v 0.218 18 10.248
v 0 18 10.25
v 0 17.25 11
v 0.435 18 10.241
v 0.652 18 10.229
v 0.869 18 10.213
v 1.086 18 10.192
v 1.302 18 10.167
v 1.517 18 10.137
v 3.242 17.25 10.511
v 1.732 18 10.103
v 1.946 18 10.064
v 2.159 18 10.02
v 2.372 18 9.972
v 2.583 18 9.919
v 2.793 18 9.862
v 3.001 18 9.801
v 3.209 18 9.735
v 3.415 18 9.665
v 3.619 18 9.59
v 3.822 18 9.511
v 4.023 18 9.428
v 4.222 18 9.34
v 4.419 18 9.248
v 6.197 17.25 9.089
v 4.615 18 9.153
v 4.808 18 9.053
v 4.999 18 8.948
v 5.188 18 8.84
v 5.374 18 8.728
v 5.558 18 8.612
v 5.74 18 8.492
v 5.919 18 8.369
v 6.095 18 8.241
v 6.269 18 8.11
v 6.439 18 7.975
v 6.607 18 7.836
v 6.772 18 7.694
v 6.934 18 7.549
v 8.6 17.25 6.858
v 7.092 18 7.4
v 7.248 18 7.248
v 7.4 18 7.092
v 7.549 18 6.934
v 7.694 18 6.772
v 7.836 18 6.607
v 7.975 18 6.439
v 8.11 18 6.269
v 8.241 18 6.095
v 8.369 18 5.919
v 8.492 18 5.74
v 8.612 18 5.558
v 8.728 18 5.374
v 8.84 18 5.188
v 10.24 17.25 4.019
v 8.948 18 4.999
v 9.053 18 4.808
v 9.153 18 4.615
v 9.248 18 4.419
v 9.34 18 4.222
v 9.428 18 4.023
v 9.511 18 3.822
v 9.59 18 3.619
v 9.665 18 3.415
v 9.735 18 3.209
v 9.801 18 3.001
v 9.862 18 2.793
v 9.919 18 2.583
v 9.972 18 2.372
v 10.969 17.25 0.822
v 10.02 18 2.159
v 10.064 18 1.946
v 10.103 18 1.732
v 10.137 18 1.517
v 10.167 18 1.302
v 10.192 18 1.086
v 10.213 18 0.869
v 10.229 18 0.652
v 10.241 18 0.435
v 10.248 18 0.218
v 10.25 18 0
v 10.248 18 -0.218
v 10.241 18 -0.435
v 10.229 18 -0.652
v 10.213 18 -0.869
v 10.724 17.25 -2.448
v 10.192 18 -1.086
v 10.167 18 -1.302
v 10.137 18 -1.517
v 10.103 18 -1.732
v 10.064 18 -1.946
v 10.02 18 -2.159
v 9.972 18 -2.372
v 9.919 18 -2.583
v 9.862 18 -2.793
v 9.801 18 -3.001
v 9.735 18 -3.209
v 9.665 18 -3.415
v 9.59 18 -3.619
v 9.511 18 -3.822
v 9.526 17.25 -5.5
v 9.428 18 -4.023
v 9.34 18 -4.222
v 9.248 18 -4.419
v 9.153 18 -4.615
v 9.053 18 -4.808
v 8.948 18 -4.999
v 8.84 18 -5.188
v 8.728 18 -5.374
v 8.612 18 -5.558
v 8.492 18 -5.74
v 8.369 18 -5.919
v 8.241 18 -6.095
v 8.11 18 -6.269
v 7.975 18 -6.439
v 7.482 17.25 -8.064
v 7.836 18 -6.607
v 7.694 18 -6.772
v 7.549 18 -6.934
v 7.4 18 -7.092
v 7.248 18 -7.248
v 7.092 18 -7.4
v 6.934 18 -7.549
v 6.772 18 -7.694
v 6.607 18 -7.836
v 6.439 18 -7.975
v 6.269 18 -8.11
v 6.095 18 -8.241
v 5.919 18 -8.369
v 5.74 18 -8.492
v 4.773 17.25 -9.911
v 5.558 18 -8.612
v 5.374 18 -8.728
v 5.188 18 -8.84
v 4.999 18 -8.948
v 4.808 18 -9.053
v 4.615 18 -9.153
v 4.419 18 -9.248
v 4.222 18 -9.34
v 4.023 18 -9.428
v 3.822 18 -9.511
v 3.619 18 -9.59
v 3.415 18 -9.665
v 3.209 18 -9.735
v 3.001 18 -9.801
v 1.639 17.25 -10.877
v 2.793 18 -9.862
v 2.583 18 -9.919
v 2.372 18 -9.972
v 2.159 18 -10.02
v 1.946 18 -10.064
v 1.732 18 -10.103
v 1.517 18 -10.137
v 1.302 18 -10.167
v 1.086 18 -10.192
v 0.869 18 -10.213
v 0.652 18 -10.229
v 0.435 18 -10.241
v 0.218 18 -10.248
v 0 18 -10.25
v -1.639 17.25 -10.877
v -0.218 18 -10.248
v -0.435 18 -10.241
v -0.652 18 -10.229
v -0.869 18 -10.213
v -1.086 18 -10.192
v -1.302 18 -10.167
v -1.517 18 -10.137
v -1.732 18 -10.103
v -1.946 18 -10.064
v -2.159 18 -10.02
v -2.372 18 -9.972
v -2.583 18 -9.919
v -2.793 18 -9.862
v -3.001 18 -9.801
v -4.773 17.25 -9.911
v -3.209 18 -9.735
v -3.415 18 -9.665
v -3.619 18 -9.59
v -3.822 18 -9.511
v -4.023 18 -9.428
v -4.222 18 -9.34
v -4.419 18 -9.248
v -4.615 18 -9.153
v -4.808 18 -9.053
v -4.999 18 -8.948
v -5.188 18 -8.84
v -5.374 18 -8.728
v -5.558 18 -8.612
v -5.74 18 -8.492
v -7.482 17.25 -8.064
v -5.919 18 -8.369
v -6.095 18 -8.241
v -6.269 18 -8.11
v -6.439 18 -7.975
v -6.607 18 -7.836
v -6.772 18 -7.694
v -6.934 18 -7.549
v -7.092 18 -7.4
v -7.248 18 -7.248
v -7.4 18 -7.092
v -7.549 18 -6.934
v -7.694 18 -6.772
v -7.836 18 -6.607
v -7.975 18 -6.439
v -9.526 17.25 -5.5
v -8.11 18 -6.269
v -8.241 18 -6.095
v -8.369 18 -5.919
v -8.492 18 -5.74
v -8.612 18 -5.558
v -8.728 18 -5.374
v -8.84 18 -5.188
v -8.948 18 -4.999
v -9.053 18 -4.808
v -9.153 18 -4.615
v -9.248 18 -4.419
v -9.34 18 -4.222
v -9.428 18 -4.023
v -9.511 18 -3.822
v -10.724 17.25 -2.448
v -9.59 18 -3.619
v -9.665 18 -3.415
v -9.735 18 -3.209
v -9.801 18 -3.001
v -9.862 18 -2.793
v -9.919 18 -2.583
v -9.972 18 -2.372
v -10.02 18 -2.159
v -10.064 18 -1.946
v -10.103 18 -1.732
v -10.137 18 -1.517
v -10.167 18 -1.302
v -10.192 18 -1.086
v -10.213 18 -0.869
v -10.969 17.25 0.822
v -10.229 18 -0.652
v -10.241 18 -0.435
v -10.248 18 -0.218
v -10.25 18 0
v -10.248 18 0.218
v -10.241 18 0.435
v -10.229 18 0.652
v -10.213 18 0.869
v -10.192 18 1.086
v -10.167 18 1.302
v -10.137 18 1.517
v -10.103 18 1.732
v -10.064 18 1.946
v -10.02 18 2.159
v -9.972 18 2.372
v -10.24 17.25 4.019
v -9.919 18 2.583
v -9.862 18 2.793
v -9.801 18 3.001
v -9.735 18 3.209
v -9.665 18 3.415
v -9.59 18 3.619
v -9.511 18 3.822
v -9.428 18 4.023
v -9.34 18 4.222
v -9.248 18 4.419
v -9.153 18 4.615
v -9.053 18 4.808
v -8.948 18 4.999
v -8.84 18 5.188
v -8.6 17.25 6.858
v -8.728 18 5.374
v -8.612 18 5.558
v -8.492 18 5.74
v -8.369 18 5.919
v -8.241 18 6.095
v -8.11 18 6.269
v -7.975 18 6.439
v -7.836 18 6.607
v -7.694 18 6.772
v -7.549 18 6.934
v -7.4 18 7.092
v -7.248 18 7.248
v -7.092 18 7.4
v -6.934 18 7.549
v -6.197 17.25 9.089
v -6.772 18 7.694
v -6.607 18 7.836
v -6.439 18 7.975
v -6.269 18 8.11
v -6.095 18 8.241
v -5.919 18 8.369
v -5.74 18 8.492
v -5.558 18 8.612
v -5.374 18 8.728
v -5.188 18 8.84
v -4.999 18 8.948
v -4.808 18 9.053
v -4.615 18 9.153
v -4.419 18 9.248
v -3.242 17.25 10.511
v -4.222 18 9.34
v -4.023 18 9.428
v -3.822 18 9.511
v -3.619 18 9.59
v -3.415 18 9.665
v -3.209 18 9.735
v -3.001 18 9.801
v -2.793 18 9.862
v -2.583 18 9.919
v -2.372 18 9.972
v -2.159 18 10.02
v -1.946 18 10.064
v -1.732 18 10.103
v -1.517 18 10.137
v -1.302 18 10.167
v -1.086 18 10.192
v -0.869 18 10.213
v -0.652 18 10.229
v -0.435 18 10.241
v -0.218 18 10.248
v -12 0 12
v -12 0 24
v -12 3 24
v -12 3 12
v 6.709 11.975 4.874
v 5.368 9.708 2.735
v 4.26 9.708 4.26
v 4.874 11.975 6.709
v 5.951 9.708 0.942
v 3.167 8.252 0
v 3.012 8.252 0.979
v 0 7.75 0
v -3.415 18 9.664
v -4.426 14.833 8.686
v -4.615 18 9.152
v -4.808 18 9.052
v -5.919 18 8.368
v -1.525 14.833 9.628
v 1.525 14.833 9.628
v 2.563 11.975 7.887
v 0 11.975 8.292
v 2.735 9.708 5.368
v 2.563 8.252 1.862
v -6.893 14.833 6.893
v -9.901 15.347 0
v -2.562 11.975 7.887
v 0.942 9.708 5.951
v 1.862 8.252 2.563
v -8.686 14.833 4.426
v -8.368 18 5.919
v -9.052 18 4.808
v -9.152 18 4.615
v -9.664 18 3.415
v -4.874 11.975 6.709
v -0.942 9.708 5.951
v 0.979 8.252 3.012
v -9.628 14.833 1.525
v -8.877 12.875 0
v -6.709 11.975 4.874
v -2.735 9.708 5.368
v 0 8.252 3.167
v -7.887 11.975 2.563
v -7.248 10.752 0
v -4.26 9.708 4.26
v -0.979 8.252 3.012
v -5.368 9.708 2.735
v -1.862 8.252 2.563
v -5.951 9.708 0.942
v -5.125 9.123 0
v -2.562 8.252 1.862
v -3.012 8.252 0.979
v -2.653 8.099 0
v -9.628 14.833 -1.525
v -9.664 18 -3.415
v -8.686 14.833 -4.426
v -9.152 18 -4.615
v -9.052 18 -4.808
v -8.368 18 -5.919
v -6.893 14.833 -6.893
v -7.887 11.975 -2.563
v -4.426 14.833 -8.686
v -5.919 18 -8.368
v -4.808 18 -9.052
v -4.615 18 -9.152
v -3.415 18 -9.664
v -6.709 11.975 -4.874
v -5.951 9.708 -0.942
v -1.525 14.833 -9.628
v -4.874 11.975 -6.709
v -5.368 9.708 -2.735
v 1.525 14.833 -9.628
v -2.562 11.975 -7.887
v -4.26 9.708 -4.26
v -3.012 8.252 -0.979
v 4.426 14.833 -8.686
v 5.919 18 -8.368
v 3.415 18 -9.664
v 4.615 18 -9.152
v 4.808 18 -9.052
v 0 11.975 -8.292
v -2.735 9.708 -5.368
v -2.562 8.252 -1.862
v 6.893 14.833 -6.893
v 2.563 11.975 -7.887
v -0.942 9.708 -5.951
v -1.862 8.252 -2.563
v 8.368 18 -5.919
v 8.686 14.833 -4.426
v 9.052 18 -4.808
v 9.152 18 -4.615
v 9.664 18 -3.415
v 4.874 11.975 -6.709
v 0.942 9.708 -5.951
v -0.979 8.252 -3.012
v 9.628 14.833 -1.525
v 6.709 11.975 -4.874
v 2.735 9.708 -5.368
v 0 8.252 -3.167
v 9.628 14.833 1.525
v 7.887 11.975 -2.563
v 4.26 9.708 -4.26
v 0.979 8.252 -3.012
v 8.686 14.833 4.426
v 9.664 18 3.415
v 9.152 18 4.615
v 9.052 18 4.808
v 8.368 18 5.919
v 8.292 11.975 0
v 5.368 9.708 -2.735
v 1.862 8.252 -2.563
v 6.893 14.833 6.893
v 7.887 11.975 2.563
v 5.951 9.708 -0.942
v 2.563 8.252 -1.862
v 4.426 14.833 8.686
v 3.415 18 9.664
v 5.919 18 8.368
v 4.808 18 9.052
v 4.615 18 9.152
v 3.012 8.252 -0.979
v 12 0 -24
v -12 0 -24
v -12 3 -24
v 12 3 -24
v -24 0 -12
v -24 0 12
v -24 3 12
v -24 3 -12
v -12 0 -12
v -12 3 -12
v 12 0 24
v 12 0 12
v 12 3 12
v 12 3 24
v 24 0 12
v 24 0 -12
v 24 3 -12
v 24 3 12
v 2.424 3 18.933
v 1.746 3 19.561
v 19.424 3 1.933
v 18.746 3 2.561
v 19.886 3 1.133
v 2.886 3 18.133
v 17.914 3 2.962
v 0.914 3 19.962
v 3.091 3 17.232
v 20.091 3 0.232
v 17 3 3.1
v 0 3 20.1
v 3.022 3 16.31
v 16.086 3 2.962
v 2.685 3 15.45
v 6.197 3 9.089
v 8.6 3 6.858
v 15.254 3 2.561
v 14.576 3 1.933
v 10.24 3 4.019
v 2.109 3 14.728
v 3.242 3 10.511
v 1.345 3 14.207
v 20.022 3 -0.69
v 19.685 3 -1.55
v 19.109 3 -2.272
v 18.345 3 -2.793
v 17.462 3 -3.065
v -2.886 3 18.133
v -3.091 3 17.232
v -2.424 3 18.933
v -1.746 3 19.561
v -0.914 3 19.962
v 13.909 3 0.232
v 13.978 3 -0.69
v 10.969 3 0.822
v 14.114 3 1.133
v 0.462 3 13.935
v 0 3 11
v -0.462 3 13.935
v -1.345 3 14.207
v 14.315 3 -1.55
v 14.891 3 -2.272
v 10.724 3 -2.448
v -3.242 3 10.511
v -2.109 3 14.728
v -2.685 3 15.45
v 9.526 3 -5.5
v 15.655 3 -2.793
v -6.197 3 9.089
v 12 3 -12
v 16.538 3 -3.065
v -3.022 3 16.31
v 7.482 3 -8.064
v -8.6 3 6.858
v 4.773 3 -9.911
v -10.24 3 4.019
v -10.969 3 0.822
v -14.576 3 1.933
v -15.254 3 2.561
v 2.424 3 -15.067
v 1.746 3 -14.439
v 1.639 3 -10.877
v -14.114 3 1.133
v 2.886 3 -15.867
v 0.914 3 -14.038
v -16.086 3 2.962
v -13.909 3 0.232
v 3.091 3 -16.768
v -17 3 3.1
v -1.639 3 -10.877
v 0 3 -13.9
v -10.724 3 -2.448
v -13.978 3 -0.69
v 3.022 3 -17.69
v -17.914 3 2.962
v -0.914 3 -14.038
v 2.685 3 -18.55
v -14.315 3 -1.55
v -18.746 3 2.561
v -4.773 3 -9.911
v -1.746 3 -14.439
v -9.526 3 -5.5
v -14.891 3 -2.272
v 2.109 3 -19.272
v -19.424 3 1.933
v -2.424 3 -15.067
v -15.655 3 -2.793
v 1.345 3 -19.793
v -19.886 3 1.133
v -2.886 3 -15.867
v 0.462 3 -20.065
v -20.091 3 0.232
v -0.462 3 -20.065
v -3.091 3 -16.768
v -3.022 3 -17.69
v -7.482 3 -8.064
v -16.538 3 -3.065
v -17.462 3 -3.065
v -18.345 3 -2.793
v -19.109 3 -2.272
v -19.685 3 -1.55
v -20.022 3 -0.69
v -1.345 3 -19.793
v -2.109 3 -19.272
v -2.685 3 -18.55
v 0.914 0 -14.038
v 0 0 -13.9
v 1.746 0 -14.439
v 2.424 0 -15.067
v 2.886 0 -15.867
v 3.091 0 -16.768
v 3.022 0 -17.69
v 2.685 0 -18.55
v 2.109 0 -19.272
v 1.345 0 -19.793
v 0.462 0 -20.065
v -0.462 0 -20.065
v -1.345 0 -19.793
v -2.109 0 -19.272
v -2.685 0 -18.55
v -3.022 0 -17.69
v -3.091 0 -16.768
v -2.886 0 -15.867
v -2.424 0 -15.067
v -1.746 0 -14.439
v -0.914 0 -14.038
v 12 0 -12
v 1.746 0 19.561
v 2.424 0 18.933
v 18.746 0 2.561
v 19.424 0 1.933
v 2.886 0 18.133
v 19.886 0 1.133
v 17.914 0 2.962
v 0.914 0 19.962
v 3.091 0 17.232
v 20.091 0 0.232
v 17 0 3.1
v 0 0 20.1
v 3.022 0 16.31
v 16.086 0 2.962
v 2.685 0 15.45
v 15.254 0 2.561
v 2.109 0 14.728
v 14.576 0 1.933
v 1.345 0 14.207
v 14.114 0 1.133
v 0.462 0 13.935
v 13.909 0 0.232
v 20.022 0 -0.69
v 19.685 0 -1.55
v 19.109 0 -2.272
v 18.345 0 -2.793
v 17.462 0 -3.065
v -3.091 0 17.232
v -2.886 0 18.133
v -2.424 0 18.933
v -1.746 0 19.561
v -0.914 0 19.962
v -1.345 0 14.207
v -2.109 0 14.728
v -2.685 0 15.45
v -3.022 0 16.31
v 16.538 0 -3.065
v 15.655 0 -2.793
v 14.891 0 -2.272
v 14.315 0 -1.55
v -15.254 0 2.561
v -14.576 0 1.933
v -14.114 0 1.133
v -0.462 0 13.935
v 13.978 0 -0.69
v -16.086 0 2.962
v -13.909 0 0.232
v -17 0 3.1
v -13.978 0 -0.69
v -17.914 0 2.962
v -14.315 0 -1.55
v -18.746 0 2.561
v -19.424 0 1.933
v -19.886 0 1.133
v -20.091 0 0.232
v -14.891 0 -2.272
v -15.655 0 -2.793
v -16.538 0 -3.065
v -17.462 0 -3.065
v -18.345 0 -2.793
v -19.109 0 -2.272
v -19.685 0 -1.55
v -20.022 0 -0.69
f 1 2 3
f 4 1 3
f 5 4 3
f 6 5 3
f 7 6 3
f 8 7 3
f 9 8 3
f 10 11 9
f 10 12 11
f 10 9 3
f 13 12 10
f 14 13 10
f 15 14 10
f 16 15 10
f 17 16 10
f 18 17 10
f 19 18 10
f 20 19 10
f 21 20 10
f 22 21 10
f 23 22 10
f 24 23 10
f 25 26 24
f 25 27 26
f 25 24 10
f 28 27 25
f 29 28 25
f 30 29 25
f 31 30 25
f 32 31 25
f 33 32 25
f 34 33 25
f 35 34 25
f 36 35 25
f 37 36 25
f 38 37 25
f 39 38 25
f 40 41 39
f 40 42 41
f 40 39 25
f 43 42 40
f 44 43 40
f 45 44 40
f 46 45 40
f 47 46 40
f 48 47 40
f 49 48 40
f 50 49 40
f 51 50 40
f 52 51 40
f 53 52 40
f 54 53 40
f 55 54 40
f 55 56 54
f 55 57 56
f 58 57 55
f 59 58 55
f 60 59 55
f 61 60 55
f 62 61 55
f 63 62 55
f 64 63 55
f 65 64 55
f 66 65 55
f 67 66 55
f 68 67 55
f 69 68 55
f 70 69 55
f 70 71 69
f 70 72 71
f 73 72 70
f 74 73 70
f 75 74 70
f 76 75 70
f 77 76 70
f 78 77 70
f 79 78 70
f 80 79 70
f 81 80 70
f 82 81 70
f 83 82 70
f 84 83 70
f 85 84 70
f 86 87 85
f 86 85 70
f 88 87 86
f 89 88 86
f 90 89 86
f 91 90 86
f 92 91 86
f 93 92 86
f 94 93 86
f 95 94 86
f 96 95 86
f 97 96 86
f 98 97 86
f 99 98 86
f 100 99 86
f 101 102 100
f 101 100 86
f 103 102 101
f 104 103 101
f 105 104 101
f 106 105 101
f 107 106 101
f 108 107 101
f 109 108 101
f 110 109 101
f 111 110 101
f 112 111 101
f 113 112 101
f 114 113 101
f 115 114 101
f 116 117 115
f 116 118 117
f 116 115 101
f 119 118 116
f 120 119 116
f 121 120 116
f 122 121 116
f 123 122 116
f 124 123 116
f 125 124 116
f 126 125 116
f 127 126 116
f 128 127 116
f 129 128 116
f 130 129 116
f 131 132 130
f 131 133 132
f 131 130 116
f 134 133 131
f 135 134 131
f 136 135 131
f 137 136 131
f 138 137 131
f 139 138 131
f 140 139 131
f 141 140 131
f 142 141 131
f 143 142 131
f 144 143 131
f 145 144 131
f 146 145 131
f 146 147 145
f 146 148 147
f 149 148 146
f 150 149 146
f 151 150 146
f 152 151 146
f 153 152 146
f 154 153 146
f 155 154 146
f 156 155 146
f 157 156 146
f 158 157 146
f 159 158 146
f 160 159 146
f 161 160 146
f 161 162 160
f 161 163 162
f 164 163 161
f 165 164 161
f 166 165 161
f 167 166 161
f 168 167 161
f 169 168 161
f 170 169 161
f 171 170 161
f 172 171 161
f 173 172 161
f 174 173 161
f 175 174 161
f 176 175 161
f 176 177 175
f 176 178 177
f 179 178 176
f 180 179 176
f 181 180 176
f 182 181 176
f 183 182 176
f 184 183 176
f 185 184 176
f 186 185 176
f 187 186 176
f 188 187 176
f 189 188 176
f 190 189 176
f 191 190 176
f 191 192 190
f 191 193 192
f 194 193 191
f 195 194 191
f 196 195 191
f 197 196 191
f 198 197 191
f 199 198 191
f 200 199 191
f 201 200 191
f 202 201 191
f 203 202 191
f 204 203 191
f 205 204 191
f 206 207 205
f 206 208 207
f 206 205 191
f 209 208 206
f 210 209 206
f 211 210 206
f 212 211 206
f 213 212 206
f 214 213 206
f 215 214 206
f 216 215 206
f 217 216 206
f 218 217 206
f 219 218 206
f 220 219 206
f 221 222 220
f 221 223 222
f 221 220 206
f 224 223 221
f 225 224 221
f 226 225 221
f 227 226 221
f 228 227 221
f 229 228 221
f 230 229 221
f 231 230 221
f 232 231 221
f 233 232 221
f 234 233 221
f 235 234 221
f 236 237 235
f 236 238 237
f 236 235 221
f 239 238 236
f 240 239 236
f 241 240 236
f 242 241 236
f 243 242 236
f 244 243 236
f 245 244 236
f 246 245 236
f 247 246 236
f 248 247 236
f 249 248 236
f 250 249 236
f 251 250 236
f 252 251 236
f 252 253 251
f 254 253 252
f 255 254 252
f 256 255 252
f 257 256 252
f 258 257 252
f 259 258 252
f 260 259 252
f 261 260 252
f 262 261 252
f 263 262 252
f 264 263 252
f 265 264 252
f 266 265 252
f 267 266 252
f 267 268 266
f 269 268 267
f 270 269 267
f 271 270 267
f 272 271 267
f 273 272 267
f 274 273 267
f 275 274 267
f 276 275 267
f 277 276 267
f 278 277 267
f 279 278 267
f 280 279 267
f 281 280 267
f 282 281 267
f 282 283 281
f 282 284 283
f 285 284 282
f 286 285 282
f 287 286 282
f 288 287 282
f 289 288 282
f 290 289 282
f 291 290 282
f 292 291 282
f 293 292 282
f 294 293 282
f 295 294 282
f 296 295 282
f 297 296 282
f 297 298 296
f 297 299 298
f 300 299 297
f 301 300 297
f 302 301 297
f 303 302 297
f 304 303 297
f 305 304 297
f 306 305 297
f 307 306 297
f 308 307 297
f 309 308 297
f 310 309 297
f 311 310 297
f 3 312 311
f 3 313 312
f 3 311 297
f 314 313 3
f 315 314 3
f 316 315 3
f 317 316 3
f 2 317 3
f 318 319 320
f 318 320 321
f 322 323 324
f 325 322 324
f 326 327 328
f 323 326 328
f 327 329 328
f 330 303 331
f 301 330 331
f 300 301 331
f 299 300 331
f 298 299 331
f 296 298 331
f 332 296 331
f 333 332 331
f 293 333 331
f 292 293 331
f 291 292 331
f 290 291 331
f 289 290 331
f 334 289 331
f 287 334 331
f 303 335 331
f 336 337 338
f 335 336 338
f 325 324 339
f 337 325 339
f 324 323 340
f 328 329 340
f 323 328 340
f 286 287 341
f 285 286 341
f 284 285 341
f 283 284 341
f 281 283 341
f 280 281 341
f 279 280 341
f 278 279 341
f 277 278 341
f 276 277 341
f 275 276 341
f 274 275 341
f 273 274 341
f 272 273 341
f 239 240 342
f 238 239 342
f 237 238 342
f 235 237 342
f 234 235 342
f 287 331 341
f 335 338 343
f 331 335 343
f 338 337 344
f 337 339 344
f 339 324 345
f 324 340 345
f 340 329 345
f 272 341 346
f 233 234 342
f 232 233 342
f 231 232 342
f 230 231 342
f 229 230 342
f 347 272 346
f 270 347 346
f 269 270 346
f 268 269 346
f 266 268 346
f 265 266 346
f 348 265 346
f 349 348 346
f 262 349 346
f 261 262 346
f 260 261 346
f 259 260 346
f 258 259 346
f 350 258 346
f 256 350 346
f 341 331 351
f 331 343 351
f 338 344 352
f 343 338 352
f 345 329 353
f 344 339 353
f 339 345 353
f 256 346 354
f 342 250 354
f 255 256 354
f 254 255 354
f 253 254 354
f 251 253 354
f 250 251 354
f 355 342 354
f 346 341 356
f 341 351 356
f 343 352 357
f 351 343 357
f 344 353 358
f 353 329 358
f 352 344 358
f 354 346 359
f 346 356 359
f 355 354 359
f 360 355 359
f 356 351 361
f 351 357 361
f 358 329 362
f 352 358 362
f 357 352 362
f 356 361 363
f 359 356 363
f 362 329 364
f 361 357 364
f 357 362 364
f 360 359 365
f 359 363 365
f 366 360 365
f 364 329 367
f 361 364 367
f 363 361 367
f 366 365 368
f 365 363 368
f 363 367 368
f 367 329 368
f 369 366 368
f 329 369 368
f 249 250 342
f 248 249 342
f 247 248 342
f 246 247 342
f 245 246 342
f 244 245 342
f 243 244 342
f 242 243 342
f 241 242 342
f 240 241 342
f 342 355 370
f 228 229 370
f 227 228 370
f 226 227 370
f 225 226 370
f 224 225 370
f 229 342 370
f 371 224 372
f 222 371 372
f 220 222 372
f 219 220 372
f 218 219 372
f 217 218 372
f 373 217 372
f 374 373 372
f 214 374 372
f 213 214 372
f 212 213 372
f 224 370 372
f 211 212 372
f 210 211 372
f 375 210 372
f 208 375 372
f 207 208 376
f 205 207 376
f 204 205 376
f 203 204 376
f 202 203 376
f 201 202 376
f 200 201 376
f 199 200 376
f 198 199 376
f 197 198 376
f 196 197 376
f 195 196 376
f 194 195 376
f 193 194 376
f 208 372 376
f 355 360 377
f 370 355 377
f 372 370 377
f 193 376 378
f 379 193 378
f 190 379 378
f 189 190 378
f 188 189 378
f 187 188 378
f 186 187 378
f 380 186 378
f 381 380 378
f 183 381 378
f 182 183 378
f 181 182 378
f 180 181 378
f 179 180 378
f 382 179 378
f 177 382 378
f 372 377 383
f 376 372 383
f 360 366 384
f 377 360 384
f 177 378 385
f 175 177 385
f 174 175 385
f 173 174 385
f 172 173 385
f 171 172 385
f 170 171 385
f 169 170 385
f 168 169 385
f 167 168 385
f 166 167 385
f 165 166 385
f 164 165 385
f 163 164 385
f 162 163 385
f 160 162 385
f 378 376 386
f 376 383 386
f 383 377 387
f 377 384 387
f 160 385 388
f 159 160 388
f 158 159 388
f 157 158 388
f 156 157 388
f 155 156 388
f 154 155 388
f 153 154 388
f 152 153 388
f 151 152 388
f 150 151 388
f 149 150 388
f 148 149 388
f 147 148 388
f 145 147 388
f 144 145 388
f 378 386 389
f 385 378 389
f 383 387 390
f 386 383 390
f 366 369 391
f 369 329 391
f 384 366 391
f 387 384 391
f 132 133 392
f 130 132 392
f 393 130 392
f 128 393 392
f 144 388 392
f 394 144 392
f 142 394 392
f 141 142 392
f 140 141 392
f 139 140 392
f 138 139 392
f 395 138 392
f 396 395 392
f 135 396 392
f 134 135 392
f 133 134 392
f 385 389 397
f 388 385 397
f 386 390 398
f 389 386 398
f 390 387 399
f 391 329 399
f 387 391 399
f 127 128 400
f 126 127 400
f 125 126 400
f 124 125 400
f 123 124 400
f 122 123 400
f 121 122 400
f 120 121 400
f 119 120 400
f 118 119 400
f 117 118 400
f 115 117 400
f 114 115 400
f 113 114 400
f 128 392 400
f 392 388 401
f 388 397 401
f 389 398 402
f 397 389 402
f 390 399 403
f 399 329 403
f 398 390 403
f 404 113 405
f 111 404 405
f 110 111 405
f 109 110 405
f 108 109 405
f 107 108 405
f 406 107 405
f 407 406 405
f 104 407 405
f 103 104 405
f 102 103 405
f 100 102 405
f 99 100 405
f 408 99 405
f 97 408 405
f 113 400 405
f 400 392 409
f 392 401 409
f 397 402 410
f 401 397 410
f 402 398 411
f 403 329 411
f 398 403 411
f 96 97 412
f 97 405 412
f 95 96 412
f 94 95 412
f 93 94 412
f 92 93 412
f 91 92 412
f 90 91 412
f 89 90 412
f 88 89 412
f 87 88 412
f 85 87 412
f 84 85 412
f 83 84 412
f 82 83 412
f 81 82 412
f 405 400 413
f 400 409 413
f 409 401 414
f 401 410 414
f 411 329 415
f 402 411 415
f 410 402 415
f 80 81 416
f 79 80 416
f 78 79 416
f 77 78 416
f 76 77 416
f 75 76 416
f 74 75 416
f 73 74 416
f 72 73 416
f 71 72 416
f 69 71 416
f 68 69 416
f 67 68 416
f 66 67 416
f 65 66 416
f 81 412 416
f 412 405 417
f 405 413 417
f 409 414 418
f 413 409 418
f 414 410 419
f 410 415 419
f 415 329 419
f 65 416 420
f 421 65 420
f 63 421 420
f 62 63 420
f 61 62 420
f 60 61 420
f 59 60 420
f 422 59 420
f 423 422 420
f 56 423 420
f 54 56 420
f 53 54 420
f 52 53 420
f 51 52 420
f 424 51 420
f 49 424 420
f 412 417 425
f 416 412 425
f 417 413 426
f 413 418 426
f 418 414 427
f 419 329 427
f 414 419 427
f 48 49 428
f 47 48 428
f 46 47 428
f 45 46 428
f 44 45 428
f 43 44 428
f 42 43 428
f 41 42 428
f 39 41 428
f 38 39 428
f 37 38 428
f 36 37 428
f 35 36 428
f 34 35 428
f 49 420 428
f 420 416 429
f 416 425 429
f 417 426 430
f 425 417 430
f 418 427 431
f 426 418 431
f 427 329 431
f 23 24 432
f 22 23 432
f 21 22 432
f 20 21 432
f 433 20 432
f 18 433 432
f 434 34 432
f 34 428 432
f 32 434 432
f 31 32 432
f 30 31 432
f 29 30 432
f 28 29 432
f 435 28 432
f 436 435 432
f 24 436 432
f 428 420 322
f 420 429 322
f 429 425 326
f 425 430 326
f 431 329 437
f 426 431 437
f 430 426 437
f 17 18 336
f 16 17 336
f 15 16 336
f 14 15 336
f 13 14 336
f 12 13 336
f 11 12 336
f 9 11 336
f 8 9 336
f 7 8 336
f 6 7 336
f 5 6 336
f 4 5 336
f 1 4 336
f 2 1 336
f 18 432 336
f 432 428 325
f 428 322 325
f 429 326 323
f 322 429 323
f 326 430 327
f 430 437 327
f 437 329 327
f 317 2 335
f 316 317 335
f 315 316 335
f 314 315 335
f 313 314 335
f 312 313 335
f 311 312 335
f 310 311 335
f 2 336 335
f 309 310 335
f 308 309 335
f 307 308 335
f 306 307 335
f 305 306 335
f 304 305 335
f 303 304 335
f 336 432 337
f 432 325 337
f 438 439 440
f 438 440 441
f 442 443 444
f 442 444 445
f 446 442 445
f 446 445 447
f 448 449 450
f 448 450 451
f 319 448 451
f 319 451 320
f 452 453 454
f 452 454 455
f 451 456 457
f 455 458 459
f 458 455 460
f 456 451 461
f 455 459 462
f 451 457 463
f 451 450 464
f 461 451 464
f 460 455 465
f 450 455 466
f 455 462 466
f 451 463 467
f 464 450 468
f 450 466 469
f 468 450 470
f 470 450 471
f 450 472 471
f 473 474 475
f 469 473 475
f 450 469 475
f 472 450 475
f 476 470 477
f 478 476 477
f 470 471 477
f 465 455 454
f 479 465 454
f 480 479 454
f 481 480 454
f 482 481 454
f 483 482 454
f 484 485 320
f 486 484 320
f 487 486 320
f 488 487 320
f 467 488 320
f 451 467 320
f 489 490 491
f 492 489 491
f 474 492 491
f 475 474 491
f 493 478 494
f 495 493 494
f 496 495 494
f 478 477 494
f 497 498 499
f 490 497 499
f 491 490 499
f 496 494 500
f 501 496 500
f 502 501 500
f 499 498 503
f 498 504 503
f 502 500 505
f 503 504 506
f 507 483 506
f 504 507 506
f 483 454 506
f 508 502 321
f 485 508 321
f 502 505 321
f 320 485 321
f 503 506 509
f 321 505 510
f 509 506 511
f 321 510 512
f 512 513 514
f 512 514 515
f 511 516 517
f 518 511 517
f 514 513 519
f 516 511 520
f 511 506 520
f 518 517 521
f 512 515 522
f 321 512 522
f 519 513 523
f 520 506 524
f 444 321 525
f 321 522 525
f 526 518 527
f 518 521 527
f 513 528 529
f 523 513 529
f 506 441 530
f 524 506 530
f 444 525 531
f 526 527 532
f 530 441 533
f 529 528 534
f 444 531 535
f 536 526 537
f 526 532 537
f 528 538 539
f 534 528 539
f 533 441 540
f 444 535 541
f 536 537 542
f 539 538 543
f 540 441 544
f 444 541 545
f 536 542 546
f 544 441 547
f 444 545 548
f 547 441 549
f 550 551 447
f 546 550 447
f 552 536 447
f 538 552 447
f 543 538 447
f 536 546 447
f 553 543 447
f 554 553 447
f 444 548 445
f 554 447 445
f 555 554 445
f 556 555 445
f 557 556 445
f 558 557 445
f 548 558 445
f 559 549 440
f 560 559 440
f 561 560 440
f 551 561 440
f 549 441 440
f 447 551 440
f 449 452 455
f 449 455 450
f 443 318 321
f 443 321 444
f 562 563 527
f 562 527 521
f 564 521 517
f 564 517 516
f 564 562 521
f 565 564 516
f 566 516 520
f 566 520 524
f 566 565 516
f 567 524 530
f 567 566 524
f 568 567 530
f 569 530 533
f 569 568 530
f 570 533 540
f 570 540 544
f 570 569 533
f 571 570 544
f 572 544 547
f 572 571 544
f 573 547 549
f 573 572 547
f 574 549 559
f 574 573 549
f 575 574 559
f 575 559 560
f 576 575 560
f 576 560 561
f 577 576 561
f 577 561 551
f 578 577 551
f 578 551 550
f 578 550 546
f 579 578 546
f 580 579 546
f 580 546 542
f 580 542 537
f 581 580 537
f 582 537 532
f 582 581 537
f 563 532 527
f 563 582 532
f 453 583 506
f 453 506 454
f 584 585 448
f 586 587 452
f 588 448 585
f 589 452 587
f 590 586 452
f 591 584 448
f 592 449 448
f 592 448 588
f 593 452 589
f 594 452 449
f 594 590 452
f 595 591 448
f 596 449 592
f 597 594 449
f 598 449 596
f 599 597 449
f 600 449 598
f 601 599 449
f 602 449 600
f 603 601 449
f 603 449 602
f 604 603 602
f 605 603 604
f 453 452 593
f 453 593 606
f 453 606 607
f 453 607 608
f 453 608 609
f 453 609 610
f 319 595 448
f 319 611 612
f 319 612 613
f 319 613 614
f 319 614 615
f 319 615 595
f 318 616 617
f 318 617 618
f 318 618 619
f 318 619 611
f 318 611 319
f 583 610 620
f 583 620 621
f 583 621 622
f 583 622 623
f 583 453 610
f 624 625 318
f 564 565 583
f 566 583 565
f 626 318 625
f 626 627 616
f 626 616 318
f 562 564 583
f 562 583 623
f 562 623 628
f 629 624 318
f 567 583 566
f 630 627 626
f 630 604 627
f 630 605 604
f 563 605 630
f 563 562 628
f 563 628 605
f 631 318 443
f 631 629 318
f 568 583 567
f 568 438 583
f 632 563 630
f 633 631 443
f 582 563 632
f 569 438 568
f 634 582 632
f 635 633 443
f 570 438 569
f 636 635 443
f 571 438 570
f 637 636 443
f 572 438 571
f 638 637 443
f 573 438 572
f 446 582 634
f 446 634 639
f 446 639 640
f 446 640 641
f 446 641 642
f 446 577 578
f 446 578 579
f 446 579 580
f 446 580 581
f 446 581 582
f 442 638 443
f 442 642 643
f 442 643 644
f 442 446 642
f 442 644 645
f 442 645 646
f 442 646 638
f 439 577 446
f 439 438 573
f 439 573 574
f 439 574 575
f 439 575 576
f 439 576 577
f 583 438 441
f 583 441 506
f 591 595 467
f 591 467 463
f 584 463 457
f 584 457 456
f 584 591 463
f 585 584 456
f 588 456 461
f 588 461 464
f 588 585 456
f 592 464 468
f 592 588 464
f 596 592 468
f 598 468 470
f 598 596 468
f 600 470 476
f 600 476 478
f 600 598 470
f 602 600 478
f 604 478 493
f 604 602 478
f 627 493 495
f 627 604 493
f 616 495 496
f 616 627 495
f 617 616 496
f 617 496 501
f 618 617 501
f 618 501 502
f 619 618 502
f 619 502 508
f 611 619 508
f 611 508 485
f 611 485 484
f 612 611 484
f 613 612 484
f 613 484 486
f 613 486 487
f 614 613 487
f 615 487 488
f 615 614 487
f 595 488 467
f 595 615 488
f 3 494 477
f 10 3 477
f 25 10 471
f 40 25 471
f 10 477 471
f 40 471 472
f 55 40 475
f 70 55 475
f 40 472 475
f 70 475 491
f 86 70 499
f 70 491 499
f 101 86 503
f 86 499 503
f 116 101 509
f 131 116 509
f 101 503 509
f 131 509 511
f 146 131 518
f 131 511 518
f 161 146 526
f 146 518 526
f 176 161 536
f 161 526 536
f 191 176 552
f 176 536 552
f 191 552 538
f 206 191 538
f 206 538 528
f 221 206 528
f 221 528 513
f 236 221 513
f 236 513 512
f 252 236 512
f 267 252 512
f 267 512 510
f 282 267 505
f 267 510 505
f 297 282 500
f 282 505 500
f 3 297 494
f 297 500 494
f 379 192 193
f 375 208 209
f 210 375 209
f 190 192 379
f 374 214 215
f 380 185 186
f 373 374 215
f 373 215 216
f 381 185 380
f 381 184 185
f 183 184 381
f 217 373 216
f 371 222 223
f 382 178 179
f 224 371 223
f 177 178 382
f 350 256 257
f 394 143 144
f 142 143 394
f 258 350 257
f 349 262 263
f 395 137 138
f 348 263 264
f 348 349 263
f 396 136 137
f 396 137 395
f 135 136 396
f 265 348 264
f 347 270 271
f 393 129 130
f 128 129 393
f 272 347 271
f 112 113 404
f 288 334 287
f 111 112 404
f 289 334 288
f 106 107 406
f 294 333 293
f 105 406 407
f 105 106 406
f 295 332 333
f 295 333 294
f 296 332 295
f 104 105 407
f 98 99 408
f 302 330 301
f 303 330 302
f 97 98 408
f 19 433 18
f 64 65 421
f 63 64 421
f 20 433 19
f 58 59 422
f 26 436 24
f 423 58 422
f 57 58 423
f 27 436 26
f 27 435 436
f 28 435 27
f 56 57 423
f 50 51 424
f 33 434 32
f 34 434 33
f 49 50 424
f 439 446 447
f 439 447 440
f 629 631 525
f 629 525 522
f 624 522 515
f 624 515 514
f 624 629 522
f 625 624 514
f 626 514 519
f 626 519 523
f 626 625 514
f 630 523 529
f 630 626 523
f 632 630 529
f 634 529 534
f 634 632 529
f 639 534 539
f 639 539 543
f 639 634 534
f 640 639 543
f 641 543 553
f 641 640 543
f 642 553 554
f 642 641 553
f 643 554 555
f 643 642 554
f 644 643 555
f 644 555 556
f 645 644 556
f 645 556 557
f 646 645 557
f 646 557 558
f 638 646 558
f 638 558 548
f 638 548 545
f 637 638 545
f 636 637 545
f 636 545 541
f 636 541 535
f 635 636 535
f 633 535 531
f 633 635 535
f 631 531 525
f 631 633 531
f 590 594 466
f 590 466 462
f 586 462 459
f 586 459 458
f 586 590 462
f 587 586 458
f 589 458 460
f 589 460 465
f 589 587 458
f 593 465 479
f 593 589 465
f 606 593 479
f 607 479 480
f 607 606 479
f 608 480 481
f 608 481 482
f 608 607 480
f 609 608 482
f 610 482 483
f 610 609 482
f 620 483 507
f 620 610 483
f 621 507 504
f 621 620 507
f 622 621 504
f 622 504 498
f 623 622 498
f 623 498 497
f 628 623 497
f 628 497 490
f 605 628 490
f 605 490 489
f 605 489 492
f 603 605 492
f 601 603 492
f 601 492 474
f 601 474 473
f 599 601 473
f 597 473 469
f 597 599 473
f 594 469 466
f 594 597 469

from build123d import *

# Parameters (mm, degrees)
SKETCH1_R           = 3.1
BOSS_EXTRUDE1_DEPTH = 3
BOSS_EXTRUDE2_START = 3
SKETCH1_5_R         = 11
BOSS_EXTRUDE2_DEPTH = 15
CHAMFER1_SIZE       = 0.75


with BuildPart() as part:
    # Sketch1 → Boss-Extrude1 (new body)
    with BuildSketch(Plane(origin=(0, 0, 0), x_dir=(1, 0, 0), z_dir=(0, 1, 0))):
        Polygon((24, 12), (24, -12), (12, -12), (12, -24), (-12, -24), (-12, -12), (-24, -12), (-24, 12), (-12, 12), (-12, 24), (12, 24), (12, 12), align=None)
        with Locations(Location((17, 0, 0), (0, 0, 270))):
            Circle(SKETCH1_R, mode=Mode.SUBTRACT)
        with Locations(Location((0, -17, 0), (0, 0, 270))):
            Circle(SKETCH1_R, mode=Mode.SUBTRACT)
        with Locations(Location((0, 17, 0), (0, 0, 270))):
            Circle(SKETCH1_R, mode=Mode.SUBTRACT)
        with Locations(Location((-17, 0, 0), (0, 0, 270))):
            Circle(SKETCH1_R, mode=Mode.SUBTRACT)
    extrude(amount=BOSS_EXTRUDE1_DEPTH)

    # Sketch1<5> → Boss-Extrude2 (add)
    with BuildSketch(Plane(origin=(0, 0, 0), x_dir=(1, 0, 0), z_dir=(0, 1, 0)).offset(BOSS_EXTRUDE2_START)):
        with Locations(Location((0, 0, 0), (0, 0, 270))):
            Circle(SKETCH1_5_R)
    extrude(amount=BOSS_EXTRUDE2_DEPTH)

    # Sketch3 → Cut-Revolve3 (revolve, cut)
    with BuildSketch(Plane.XY, mode=Mode.PRIVATE) as cut_revolve3_sk:
        with BuildLine():
            Line((0, 18), (10.25, 18))
            ThreePointArc((10.25, 18), (7.247844507, 10.752155493), (0, 7.75))
            Line((0, 7.75), (0, 18))
        make_face()
    revolve(cut_revolve3_sk.sketch.rotate(Axis((0, 18, 0), (0, -1, 0)), 180), axis=Axis((0, 18, 0), (0, -1, 0)), mode=Mode.SUBTRACT)

    # Chamfer1
    chamfer1_edges = [part.edges().sort_by_distance(p)[0] for p in [
        (0, 18, -11),
    ]]
    chamfer(chamfer1_edges, length=CHAMFER1_SIZE - 0.0001)  # a hair under: the kernel refuses the full size


solid = part.part
